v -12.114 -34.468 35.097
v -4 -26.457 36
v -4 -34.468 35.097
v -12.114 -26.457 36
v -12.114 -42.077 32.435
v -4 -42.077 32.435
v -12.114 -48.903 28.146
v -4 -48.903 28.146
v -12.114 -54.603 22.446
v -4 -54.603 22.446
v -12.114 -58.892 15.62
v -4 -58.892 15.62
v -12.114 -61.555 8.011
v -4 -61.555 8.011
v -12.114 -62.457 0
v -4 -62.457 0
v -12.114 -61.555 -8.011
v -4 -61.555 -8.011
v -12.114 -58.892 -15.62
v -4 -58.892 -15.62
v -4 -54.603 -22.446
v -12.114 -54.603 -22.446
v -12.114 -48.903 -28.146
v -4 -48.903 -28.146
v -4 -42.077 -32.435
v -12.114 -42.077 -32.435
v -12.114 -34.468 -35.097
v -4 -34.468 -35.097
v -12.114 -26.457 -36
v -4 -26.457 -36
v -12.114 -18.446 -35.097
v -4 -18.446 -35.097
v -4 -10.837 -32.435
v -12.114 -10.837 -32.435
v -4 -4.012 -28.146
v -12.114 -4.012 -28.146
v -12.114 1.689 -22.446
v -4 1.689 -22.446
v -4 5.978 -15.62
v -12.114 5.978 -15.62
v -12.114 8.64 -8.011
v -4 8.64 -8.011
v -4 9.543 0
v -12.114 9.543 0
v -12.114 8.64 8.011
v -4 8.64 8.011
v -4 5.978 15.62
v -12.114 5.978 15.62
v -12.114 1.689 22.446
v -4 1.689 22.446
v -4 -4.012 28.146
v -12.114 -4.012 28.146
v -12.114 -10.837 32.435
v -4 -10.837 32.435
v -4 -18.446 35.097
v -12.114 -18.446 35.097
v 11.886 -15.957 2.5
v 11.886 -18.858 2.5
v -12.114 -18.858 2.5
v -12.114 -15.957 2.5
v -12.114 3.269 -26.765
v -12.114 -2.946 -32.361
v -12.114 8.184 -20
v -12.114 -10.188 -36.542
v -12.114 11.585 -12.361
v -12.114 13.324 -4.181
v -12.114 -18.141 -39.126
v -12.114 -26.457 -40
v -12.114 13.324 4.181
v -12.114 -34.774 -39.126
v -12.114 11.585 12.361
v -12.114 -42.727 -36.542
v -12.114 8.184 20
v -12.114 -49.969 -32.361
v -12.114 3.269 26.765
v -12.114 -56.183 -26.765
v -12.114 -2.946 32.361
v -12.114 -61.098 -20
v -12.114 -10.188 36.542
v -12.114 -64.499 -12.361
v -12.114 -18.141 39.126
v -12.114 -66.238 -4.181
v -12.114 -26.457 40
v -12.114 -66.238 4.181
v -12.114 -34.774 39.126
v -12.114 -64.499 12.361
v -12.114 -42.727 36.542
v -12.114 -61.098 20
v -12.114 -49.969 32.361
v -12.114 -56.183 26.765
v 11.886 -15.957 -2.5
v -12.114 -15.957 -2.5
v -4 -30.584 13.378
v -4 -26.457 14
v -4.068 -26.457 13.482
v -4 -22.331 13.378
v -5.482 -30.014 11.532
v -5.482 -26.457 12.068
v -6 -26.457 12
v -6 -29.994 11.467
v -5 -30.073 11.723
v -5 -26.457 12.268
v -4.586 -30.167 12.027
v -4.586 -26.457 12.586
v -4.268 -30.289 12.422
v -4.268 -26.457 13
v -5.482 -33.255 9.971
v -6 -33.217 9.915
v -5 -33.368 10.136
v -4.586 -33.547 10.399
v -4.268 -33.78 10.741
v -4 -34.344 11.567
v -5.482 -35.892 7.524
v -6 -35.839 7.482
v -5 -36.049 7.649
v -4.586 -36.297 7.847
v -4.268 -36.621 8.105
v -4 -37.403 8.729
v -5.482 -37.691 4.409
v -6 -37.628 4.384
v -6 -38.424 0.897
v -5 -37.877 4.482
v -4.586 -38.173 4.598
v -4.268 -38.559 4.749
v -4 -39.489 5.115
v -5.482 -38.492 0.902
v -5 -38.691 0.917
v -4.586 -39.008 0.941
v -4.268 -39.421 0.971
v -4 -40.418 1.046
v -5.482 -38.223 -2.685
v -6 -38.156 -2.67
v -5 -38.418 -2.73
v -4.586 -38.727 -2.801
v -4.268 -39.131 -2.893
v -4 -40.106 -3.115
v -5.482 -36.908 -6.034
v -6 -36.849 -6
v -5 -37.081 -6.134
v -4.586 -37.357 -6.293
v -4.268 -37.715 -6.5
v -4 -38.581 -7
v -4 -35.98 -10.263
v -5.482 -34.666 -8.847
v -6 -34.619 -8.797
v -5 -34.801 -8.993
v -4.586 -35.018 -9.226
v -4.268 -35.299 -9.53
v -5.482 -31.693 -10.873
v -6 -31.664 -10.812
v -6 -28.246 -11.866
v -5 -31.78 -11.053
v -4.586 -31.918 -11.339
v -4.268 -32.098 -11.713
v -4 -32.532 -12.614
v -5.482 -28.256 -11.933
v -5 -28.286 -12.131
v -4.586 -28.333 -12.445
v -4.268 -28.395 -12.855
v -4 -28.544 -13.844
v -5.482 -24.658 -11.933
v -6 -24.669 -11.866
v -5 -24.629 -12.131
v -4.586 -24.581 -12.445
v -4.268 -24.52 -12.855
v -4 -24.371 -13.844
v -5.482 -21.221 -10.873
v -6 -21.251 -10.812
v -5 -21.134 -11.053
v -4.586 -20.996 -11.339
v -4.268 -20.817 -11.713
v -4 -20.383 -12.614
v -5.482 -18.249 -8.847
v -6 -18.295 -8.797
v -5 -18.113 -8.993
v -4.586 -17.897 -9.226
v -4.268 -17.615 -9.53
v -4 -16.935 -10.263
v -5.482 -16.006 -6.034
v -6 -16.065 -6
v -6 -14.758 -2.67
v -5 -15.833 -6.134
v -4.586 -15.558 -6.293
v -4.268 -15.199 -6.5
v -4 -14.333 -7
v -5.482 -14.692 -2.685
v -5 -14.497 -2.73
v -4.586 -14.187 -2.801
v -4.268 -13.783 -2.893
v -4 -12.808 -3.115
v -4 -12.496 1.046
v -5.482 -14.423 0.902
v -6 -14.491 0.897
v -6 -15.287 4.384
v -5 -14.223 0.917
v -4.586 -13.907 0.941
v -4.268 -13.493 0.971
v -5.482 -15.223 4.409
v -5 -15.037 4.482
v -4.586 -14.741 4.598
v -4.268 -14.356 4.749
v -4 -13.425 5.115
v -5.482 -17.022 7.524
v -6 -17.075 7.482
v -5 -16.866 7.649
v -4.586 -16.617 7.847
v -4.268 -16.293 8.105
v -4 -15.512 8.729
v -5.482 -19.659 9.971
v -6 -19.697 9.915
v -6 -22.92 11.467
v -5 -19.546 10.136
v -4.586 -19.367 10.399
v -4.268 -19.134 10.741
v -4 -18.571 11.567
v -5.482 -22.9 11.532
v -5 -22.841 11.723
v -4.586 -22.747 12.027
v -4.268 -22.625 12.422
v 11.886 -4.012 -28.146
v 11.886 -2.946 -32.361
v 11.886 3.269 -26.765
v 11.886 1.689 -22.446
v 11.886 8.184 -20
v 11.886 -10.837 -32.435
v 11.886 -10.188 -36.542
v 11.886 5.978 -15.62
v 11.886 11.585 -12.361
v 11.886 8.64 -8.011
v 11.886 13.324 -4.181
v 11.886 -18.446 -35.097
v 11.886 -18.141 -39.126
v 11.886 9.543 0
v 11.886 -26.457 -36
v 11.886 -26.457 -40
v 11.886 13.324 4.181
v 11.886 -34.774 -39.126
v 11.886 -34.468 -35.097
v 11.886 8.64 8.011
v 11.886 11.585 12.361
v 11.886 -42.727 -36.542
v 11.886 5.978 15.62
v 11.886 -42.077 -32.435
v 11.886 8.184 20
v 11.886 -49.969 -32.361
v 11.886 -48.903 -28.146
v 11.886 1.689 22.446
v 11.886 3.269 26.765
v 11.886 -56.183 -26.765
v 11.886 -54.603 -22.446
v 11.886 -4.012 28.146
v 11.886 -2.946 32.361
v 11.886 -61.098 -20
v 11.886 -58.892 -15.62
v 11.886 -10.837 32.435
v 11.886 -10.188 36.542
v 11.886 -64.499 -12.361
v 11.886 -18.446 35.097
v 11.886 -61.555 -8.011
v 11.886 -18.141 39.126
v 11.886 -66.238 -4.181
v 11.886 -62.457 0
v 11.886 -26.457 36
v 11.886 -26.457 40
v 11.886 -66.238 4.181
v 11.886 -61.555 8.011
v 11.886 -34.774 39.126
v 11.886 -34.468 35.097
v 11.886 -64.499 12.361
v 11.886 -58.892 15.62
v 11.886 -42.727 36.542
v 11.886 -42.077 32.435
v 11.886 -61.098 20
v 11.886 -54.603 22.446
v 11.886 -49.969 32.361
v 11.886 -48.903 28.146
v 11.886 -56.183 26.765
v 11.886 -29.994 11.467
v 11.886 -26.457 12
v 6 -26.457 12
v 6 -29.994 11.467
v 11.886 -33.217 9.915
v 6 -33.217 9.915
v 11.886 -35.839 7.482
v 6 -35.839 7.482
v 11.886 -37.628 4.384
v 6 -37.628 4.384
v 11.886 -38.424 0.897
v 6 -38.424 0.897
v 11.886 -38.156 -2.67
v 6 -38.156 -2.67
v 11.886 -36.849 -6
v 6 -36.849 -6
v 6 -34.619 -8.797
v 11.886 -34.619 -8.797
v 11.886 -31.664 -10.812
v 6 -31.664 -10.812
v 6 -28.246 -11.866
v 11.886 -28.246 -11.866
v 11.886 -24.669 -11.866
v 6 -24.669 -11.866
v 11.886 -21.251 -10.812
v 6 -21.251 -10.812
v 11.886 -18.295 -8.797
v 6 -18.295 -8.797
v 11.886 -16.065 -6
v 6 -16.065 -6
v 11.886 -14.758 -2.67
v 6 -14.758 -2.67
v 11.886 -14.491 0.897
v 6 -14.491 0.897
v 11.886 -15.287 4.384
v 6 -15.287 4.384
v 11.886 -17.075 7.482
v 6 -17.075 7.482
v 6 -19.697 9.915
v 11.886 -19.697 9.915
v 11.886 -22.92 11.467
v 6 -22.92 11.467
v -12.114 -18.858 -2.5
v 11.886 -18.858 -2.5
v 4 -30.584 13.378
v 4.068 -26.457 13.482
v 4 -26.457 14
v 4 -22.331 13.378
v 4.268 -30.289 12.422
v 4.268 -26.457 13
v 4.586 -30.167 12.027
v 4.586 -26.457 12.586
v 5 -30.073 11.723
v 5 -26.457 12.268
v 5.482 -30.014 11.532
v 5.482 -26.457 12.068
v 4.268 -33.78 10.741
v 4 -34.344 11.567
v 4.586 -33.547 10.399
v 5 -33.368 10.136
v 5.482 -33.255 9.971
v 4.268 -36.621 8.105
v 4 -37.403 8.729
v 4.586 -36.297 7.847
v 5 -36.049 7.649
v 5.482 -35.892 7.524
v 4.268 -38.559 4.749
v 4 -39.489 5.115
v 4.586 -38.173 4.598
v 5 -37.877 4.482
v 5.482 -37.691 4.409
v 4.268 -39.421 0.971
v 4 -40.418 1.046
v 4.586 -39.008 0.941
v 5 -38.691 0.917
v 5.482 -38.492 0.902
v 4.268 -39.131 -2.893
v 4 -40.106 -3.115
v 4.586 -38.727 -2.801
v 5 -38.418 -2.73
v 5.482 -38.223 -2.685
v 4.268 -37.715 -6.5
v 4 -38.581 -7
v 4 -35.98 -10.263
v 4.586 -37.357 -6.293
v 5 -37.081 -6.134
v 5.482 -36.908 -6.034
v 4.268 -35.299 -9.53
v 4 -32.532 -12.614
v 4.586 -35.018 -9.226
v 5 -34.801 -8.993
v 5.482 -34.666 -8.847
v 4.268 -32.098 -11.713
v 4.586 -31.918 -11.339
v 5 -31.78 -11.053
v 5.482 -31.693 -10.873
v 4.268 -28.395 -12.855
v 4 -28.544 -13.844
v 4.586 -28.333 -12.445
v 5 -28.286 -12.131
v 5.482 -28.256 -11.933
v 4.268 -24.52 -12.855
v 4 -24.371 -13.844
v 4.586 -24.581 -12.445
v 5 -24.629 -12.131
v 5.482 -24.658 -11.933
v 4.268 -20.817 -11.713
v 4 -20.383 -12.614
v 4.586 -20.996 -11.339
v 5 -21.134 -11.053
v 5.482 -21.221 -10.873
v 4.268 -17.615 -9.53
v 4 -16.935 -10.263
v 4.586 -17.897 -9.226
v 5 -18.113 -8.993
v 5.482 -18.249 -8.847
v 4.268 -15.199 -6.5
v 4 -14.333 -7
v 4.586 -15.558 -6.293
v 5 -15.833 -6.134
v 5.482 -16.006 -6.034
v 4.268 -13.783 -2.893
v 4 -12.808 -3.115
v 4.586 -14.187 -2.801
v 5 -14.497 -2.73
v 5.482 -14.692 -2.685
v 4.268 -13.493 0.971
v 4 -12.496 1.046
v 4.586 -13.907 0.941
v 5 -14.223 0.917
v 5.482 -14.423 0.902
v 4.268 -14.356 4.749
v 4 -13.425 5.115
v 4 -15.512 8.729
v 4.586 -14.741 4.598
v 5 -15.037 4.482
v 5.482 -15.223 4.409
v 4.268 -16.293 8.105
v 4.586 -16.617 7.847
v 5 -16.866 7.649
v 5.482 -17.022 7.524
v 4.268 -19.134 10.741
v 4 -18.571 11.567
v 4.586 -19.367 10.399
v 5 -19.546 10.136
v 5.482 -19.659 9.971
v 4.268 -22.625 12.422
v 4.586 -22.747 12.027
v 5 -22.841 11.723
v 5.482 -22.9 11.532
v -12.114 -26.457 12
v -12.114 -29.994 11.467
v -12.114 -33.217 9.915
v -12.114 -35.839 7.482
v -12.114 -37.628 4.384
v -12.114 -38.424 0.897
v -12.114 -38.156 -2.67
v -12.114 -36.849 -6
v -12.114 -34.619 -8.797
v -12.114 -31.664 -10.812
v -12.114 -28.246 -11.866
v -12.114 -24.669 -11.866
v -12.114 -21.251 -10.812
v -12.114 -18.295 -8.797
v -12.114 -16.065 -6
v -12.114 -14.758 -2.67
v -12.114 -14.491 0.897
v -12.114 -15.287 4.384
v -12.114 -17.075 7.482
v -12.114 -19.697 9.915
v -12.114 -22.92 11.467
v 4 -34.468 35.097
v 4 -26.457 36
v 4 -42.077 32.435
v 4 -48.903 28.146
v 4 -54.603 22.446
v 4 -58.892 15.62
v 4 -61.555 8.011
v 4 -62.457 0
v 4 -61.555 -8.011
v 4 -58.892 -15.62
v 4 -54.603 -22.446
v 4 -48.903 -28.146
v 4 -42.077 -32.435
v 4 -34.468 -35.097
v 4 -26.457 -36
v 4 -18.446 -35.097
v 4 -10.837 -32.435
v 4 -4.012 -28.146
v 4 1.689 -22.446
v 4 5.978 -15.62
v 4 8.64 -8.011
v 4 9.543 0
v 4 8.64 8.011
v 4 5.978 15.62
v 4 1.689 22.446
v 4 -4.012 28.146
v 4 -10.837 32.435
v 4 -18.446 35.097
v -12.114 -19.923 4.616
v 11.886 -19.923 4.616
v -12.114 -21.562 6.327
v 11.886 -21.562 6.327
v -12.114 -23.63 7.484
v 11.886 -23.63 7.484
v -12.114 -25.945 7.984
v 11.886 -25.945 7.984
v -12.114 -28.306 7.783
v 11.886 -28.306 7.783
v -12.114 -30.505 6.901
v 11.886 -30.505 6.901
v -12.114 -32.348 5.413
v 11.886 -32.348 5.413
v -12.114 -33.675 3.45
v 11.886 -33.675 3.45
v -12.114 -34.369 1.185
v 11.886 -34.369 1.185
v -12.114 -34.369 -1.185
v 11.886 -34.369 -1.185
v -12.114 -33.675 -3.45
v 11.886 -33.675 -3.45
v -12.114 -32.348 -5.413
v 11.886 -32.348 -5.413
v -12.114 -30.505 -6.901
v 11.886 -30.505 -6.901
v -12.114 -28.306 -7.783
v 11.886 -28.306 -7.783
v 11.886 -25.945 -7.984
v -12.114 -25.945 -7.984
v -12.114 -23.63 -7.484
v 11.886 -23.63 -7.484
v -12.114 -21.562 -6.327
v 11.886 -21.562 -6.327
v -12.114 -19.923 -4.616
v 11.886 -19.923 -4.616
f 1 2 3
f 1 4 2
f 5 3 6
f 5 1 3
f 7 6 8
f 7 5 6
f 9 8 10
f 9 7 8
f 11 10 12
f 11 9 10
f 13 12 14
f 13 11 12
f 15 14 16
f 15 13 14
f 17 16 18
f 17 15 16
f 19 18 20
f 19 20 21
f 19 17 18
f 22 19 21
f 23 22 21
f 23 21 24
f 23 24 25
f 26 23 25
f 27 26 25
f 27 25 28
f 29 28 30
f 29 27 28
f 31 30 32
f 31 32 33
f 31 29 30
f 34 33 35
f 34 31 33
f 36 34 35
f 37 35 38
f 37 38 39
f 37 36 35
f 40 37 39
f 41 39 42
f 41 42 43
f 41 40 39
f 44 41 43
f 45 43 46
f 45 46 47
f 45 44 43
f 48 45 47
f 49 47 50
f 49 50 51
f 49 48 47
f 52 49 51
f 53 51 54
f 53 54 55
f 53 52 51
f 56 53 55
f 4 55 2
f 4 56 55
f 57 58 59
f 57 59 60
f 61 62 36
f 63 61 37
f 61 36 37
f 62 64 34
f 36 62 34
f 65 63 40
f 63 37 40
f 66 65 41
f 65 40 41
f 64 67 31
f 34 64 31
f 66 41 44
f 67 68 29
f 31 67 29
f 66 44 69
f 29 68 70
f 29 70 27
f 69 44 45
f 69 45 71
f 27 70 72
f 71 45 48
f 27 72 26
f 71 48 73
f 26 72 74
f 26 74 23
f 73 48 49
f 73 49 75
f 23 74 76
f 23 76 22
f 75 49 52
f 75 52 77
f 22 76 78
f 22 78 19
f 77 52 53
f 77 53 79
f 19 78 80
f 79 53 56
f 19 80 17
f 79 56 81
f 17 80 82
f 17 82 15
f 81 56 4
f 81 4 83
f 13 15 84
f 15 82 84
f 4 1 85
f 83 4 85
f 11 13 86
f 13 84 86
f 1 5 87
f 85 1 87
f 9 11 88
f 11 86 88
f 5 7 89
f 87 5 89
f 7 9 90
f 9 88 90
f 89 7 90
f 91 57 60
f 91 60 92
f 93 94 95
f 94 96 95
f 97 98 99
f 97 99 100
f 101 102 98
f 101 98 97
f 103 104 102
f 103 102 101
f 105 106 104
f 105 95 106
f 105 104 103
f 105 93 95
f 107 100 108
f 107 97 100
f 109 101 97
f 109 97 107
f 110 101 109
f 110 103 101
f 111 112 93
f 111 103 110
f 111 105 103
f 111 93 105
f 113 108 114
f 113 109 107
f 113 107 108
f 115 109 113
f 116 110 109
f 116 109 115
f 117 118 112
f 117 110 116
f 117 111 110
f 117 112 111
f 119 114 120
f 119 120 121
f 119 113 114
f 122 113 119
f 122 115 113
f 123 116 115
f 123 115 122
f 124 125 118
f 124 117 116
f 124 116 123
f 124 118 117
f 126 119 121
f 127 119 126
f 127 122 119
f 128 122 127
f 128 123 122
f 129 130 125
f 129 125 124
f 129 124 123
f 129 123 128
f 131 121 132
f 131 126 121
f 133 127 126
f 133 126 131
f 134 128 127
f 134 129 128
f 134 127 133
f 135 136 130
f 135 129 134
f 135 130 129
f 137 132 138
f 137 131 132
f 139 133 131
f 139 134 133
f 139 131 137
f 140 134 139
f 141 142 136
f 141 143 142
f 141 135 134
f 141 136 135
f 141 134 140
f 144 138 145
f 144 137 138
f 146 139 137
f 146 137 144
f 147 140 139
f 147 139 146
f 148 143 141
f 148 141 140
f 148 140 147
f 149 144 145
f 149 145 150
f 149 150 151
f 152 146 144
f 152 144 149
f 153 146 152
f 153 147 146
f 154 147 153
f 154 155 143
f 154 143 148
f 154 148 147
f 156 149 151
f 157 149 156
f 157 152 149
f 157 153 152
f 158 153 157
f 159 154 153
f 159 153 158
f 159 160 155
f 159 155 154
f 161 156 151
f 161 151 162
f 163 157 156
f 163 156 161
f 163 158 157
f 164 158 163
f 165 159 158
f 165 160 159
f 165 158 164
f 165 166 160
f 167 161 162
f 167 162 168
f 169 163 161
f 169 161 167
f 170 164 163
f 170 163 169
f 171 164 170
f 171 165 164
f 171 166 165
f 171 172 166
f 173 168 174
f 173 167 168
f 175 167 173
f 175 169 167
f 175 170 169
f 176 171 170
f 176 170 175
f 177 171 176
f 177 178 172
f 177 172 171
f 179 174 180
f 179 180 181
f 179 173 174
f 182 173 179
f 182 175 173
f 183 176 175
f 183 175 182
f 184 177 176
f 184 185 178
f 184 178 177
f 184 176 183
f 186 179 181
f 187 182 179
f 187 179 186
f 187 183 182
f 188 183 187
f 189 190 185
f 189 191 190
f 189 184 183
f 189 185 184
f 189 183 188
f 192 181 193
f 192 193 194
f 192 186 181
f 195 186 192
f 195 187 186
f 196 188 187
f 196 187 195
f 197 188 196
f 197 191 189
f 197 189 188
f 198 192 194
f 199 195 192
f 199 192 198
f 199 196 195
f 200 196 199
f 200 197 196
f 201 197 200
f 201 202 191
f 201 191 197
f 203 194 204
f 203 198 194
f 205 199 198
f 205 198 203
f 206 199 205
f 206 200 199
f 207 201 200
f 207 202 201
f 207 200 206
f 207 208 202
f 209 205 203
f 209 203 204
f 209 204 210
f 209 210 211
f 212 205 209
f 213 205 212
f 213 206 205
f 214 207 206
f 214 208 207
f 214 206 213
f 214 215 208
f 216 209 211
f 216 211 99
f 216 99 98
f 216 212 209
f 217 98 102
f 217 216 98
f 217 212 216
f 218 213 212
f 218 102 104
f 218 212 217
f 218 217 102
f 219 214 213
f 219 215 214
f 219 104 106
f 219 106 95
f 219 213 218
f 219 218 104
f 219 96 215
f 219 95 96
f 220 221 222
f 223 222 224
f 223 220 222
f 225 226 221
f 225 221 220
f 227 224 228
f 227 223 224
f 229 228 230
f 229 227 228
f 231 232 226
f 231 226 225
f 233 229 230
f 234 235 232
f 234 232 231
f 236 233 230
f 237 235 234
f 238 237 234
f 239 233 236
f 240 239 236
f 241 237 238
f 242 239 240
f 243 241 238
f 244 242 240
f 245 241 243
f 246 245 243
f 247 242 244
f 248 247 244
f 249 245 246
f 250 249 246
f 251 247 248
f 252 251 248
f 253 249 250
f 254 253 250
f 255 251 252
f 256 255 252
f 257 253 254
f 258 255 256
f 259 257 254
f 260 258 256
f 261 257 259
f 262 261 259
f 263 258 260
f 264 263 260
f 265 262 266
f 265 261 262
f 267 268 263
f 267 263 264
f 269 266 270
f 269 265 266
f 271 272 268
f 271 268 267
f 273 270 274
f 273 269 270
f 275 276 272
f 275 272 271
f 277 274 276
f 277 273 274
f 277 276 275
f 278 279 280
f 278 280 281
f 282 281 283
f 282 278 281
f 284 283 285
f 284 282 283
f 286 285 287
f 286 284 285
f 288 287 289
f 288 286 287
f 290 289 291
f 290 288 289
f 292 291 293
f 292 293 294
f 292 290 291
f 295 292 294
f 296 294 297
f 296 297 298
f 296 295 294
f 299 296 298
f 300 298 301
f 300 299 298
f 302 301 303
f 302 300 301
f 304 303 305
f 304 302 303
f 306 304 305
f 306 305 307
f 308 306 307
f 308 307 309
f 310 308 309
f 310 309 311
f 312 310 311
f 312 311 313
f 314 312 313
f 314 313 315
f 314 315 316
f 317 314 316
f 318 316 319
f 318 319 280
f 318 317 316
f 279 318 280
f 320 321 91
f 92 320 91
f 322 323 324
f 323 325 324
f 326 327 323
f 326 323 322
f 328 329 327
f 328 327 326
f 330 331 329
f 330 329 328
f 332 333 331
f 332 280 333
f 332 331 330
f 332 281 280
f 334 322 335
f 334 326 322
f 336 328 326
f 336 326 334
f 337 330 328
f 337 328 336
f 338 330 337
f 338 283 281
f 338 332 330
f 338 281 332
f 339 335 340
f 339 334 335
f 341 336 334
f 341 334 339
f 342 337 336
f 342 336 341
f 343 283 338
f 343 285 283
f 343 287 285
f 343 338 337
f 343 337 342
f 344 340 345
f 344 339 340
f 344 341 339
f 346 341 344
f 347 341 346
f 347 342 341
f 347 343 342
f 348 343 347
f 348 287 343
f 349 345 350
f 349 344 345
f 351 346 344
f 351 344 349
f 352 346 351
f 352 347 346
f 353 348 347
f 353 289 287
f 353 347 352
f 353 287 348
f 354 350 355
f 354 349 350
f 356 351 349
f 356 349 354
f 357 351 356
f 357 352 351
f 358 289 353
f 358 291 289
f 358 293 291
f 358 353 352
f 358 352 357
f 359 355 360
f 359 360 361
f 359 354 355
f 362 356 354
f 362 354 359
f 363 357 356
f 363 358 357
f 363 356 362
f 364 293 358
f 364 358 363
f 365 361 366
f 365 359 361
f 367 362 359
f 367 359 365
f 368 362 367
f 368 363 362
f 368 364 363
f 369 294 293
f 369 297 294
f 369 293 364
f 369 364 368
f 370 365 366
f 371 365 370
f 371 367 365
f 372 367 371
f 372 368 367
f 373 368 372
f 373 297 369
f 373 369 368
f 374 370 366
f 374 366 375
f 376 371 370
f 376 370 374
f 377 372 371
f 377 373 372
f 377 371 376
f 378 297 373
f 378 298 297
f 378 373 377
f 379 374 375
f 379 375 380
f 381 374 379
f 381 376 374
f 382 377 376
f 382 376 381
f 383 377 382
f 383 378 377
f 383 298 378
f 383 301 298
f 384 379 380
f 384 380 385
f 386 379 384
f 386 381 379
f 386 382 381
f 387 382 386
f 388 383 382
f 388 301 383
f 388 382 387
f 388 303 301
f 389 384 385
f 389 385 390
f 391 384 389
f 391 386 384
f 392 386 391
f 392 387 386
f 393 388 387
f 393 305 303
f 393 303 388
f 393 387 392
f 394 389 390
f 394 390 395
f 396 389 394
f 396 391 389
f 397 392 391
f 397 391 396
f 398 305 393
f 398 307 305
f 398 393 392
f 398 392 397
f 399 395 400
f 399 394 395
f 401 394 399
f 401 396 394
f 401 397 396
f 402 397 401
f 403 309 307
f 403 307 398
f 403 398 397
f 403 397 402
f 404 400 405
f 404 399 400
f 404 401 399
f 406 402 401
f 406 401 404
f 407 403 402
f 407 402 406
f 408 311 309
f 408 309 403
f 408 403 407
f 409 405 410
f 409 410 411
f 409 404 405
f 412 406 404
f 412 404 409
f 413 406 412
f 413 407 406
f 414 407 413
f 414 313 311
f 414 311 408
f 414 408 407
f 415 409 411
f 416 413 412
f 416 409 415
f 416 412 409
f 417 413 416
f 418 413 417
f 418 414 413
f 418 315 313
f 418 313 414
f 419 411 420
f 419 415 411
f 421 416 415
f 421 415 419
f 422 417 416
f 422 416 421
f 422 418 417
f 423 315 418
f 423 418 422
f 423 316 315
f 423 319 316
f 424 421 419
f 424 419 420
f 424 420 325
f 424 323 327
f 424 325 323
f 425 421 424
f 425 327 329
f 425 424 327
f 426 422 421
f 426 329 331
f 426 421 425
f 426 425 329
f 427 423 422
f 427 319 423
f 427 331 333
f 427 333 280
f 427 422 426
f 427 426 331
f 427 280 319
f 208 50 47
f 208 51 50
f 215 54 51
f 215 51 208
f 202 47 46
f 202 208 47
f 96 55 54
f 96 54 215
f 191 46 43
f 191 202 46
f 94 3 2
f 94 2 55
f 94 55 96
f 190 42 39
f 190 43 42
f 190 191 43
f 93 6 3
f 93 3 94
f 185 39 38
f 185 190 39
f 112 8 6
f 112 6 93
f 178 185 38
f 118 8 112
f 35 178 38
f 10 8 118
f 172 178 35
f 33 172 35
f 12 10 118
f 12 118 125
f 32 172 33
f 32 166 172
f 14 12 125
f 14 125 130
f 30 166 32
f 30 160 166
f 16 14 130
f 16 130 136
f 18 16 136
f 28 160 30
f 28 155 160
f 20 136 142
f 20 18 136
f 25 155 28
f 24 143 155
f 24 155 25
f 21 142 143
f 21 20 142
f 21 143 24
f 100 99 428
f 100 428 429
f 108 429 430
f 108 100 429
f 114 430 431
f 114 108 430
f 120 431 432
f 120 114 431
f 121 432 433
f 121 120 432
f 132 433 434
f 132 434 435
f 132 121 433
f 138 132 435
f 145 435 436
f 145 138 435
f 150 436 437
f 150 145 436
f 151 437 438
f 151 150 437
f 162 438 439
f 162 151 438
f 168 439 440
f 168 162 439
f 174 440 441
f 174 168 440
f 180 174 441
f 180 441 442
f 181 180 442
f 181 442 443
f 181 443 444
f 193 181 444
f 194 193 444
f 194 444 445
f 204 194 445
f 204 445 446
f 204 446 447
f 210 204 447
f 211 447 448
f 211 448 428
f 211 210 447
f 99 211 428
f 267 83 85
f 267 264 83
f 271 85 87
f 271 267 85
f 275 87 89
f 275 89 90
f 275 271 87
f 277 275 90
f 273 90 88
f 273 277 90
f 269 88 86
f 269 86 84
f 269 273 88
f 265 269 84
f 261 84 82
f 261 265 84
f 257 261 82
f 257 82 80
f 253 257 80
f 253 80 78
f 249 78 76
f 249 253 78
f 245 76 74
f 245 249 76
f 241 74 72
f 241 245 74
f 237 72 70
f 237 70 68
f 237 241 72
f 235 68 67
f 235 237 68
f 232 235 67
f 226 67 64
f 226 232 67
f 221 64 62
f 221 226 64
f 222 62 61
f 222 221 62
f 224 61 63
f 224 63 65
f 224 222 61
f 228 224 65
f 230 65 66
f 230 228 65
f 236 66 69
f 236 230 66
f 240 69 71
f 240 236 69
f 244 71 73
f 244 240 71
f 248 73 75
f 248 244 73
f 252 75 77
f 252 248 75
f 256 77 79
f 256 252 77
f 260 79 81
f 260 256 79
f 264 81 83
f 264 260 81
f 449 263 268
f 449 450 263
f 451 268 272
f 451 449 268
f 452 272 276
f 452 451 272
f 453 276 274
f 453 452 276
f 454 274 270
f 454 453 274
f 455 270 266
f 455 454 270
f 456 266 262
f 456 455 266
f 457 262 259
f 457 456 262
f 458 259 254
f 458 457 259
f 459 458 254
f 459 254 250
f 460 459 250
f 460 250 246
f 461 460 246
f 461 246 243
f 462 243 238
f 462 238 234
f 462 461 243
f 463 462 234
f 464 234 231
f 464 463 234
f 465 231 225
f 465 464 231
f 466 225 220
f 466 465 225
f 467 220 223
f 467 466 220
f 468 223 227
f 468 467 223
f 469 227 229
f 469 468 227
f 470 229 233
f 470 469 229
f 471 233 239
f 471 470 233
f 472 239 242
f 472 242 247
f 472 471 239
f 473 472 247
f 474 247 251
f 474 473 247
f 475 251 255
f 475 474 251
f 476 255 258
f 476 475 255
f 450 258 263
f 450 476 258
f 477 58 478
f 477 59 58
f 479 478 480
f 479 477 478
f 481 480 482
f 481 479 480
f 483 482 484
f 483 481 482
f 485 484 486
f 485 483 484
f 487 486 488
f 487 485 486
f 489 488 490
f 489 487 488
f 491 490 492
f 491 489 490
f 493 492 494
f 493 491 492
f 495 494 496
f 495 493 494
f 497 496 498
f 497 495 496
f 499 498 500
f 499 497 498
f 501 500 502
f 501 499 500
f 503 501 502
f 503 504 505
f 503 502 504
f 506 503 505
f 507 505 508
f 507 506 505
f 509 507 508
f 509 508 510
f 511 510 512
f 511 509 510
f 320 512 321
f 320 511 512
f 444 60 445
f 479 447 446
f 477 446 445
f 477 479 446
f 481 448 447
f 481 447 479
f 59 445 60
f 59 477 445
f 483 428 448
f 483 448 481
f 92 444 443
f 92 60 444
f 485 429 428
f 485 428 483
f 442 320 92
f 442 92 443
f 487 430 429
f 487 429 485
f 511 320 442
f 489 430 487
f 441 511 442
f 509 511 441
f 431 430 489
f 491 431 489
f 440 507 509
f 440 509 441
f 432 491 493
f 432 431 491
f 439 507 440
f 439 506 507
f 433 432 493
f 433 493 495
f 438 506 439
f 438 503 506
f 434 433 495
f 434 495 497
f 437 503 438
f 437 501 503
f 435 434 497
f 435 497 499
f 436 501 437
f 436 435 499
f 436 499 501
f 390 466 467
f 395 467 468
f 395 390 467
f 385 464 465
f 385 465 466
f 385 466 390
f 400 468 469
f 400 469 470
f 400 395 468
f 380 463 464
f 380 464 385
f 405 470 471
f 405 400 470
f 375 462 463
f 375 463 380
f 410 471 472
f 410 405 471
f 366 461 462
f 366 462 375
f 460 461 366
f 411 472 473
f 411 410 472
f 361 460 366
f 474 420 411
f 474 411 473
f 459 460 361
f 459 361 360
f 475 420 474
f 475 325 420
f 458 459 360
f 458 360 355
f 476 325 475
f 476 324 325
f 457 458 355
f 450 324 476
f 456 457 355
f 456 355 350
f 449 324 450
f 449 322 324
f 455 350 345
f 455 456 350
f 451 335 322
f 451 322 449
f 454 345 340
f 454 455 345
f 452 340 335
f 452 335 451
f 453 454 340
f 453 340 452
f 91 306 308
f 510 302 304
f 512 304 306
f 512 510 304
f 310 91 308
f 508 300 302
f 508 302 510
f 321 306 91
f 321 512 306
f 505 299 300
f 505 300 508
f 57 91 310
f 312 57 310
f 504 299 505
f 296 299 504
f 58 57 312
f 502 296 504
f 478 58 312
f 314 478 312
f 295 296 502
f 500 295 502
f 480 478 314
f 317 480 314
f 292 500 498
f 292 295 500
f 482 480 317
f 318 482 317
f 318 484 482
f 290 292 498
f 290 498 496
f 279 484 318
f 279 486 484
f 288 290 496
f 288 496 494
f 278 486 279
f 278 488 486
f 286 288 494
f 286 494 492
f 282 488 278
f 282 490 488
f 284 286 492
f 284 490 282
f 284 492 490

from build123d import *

# Parameters (mm, degrees)
SKETCH2_W          = 5
SKETCH2_H          = 4.464495409
CUT_EXTRUDE1_DEPTH = 82.228385508
FILLET1_R          = 2
FILLET2_R          = 2


with BuildPart() as part:
    # Sketch1 → Revolve1 (revolve)
    with BuildSketch(Plane.XY, mode=Mode.PRIVATE) as revolve1_sk:
        Polygon((-12.114285714, 13.542857143), (11.885714286, 13.542857143), (11.885714286, 9.542857143), (4, 9.542857143), (4, -14.457142857), (11.885714286, -14.457142857), (11.885714286, -18.457142857), (-12.114285714, -18.457142857), (-12.114285714, -14.457142857), (-4, -14.457142857), (-4, 9.542857143), (-12.114285714, 9.542857143), (-12.114285714, 12.742857143), align=None)
    revolve(revolve1_sk.sketch.rotate(Axis((-20.457142857, -26.457142857, 0), (1, 0, 0)), 90), axis=Axis((-20.457142857, -26.457142857, 0), (1, 0, 0)))

    # Sketch2 → Cut-Extrude1 (cut, through all)
    with BuildSketch(Plane(origin=(12, 0, 0), x_dir=(0, 0, -1), z_dir=(1, 0, 0))):
        with Locations((0, -18.189390562)):
            Rectangle(SKETCH2_W, SKETCH2_H)
    extrude(amount=-CUT_EXTRUDE1_DEPTH, mode=Mode.SUBTRACT)

    # Fillet1
    fillet1_edges = [part.edges().sort_by_distance(p)[0] for p in [
        (4, -26.457142857, -12),
    ]]
    fillet(fillet1_edges, radius=FILLET1_R)

    # Fillet2
    fillet2_edges = [part.edges().sort_by_distance(p)[0] for p in [
        (-4, -26.457142857, -12),
    ]]
    fillet(fillet2_edges, radius=FILLET2_R)


solid = part.part
